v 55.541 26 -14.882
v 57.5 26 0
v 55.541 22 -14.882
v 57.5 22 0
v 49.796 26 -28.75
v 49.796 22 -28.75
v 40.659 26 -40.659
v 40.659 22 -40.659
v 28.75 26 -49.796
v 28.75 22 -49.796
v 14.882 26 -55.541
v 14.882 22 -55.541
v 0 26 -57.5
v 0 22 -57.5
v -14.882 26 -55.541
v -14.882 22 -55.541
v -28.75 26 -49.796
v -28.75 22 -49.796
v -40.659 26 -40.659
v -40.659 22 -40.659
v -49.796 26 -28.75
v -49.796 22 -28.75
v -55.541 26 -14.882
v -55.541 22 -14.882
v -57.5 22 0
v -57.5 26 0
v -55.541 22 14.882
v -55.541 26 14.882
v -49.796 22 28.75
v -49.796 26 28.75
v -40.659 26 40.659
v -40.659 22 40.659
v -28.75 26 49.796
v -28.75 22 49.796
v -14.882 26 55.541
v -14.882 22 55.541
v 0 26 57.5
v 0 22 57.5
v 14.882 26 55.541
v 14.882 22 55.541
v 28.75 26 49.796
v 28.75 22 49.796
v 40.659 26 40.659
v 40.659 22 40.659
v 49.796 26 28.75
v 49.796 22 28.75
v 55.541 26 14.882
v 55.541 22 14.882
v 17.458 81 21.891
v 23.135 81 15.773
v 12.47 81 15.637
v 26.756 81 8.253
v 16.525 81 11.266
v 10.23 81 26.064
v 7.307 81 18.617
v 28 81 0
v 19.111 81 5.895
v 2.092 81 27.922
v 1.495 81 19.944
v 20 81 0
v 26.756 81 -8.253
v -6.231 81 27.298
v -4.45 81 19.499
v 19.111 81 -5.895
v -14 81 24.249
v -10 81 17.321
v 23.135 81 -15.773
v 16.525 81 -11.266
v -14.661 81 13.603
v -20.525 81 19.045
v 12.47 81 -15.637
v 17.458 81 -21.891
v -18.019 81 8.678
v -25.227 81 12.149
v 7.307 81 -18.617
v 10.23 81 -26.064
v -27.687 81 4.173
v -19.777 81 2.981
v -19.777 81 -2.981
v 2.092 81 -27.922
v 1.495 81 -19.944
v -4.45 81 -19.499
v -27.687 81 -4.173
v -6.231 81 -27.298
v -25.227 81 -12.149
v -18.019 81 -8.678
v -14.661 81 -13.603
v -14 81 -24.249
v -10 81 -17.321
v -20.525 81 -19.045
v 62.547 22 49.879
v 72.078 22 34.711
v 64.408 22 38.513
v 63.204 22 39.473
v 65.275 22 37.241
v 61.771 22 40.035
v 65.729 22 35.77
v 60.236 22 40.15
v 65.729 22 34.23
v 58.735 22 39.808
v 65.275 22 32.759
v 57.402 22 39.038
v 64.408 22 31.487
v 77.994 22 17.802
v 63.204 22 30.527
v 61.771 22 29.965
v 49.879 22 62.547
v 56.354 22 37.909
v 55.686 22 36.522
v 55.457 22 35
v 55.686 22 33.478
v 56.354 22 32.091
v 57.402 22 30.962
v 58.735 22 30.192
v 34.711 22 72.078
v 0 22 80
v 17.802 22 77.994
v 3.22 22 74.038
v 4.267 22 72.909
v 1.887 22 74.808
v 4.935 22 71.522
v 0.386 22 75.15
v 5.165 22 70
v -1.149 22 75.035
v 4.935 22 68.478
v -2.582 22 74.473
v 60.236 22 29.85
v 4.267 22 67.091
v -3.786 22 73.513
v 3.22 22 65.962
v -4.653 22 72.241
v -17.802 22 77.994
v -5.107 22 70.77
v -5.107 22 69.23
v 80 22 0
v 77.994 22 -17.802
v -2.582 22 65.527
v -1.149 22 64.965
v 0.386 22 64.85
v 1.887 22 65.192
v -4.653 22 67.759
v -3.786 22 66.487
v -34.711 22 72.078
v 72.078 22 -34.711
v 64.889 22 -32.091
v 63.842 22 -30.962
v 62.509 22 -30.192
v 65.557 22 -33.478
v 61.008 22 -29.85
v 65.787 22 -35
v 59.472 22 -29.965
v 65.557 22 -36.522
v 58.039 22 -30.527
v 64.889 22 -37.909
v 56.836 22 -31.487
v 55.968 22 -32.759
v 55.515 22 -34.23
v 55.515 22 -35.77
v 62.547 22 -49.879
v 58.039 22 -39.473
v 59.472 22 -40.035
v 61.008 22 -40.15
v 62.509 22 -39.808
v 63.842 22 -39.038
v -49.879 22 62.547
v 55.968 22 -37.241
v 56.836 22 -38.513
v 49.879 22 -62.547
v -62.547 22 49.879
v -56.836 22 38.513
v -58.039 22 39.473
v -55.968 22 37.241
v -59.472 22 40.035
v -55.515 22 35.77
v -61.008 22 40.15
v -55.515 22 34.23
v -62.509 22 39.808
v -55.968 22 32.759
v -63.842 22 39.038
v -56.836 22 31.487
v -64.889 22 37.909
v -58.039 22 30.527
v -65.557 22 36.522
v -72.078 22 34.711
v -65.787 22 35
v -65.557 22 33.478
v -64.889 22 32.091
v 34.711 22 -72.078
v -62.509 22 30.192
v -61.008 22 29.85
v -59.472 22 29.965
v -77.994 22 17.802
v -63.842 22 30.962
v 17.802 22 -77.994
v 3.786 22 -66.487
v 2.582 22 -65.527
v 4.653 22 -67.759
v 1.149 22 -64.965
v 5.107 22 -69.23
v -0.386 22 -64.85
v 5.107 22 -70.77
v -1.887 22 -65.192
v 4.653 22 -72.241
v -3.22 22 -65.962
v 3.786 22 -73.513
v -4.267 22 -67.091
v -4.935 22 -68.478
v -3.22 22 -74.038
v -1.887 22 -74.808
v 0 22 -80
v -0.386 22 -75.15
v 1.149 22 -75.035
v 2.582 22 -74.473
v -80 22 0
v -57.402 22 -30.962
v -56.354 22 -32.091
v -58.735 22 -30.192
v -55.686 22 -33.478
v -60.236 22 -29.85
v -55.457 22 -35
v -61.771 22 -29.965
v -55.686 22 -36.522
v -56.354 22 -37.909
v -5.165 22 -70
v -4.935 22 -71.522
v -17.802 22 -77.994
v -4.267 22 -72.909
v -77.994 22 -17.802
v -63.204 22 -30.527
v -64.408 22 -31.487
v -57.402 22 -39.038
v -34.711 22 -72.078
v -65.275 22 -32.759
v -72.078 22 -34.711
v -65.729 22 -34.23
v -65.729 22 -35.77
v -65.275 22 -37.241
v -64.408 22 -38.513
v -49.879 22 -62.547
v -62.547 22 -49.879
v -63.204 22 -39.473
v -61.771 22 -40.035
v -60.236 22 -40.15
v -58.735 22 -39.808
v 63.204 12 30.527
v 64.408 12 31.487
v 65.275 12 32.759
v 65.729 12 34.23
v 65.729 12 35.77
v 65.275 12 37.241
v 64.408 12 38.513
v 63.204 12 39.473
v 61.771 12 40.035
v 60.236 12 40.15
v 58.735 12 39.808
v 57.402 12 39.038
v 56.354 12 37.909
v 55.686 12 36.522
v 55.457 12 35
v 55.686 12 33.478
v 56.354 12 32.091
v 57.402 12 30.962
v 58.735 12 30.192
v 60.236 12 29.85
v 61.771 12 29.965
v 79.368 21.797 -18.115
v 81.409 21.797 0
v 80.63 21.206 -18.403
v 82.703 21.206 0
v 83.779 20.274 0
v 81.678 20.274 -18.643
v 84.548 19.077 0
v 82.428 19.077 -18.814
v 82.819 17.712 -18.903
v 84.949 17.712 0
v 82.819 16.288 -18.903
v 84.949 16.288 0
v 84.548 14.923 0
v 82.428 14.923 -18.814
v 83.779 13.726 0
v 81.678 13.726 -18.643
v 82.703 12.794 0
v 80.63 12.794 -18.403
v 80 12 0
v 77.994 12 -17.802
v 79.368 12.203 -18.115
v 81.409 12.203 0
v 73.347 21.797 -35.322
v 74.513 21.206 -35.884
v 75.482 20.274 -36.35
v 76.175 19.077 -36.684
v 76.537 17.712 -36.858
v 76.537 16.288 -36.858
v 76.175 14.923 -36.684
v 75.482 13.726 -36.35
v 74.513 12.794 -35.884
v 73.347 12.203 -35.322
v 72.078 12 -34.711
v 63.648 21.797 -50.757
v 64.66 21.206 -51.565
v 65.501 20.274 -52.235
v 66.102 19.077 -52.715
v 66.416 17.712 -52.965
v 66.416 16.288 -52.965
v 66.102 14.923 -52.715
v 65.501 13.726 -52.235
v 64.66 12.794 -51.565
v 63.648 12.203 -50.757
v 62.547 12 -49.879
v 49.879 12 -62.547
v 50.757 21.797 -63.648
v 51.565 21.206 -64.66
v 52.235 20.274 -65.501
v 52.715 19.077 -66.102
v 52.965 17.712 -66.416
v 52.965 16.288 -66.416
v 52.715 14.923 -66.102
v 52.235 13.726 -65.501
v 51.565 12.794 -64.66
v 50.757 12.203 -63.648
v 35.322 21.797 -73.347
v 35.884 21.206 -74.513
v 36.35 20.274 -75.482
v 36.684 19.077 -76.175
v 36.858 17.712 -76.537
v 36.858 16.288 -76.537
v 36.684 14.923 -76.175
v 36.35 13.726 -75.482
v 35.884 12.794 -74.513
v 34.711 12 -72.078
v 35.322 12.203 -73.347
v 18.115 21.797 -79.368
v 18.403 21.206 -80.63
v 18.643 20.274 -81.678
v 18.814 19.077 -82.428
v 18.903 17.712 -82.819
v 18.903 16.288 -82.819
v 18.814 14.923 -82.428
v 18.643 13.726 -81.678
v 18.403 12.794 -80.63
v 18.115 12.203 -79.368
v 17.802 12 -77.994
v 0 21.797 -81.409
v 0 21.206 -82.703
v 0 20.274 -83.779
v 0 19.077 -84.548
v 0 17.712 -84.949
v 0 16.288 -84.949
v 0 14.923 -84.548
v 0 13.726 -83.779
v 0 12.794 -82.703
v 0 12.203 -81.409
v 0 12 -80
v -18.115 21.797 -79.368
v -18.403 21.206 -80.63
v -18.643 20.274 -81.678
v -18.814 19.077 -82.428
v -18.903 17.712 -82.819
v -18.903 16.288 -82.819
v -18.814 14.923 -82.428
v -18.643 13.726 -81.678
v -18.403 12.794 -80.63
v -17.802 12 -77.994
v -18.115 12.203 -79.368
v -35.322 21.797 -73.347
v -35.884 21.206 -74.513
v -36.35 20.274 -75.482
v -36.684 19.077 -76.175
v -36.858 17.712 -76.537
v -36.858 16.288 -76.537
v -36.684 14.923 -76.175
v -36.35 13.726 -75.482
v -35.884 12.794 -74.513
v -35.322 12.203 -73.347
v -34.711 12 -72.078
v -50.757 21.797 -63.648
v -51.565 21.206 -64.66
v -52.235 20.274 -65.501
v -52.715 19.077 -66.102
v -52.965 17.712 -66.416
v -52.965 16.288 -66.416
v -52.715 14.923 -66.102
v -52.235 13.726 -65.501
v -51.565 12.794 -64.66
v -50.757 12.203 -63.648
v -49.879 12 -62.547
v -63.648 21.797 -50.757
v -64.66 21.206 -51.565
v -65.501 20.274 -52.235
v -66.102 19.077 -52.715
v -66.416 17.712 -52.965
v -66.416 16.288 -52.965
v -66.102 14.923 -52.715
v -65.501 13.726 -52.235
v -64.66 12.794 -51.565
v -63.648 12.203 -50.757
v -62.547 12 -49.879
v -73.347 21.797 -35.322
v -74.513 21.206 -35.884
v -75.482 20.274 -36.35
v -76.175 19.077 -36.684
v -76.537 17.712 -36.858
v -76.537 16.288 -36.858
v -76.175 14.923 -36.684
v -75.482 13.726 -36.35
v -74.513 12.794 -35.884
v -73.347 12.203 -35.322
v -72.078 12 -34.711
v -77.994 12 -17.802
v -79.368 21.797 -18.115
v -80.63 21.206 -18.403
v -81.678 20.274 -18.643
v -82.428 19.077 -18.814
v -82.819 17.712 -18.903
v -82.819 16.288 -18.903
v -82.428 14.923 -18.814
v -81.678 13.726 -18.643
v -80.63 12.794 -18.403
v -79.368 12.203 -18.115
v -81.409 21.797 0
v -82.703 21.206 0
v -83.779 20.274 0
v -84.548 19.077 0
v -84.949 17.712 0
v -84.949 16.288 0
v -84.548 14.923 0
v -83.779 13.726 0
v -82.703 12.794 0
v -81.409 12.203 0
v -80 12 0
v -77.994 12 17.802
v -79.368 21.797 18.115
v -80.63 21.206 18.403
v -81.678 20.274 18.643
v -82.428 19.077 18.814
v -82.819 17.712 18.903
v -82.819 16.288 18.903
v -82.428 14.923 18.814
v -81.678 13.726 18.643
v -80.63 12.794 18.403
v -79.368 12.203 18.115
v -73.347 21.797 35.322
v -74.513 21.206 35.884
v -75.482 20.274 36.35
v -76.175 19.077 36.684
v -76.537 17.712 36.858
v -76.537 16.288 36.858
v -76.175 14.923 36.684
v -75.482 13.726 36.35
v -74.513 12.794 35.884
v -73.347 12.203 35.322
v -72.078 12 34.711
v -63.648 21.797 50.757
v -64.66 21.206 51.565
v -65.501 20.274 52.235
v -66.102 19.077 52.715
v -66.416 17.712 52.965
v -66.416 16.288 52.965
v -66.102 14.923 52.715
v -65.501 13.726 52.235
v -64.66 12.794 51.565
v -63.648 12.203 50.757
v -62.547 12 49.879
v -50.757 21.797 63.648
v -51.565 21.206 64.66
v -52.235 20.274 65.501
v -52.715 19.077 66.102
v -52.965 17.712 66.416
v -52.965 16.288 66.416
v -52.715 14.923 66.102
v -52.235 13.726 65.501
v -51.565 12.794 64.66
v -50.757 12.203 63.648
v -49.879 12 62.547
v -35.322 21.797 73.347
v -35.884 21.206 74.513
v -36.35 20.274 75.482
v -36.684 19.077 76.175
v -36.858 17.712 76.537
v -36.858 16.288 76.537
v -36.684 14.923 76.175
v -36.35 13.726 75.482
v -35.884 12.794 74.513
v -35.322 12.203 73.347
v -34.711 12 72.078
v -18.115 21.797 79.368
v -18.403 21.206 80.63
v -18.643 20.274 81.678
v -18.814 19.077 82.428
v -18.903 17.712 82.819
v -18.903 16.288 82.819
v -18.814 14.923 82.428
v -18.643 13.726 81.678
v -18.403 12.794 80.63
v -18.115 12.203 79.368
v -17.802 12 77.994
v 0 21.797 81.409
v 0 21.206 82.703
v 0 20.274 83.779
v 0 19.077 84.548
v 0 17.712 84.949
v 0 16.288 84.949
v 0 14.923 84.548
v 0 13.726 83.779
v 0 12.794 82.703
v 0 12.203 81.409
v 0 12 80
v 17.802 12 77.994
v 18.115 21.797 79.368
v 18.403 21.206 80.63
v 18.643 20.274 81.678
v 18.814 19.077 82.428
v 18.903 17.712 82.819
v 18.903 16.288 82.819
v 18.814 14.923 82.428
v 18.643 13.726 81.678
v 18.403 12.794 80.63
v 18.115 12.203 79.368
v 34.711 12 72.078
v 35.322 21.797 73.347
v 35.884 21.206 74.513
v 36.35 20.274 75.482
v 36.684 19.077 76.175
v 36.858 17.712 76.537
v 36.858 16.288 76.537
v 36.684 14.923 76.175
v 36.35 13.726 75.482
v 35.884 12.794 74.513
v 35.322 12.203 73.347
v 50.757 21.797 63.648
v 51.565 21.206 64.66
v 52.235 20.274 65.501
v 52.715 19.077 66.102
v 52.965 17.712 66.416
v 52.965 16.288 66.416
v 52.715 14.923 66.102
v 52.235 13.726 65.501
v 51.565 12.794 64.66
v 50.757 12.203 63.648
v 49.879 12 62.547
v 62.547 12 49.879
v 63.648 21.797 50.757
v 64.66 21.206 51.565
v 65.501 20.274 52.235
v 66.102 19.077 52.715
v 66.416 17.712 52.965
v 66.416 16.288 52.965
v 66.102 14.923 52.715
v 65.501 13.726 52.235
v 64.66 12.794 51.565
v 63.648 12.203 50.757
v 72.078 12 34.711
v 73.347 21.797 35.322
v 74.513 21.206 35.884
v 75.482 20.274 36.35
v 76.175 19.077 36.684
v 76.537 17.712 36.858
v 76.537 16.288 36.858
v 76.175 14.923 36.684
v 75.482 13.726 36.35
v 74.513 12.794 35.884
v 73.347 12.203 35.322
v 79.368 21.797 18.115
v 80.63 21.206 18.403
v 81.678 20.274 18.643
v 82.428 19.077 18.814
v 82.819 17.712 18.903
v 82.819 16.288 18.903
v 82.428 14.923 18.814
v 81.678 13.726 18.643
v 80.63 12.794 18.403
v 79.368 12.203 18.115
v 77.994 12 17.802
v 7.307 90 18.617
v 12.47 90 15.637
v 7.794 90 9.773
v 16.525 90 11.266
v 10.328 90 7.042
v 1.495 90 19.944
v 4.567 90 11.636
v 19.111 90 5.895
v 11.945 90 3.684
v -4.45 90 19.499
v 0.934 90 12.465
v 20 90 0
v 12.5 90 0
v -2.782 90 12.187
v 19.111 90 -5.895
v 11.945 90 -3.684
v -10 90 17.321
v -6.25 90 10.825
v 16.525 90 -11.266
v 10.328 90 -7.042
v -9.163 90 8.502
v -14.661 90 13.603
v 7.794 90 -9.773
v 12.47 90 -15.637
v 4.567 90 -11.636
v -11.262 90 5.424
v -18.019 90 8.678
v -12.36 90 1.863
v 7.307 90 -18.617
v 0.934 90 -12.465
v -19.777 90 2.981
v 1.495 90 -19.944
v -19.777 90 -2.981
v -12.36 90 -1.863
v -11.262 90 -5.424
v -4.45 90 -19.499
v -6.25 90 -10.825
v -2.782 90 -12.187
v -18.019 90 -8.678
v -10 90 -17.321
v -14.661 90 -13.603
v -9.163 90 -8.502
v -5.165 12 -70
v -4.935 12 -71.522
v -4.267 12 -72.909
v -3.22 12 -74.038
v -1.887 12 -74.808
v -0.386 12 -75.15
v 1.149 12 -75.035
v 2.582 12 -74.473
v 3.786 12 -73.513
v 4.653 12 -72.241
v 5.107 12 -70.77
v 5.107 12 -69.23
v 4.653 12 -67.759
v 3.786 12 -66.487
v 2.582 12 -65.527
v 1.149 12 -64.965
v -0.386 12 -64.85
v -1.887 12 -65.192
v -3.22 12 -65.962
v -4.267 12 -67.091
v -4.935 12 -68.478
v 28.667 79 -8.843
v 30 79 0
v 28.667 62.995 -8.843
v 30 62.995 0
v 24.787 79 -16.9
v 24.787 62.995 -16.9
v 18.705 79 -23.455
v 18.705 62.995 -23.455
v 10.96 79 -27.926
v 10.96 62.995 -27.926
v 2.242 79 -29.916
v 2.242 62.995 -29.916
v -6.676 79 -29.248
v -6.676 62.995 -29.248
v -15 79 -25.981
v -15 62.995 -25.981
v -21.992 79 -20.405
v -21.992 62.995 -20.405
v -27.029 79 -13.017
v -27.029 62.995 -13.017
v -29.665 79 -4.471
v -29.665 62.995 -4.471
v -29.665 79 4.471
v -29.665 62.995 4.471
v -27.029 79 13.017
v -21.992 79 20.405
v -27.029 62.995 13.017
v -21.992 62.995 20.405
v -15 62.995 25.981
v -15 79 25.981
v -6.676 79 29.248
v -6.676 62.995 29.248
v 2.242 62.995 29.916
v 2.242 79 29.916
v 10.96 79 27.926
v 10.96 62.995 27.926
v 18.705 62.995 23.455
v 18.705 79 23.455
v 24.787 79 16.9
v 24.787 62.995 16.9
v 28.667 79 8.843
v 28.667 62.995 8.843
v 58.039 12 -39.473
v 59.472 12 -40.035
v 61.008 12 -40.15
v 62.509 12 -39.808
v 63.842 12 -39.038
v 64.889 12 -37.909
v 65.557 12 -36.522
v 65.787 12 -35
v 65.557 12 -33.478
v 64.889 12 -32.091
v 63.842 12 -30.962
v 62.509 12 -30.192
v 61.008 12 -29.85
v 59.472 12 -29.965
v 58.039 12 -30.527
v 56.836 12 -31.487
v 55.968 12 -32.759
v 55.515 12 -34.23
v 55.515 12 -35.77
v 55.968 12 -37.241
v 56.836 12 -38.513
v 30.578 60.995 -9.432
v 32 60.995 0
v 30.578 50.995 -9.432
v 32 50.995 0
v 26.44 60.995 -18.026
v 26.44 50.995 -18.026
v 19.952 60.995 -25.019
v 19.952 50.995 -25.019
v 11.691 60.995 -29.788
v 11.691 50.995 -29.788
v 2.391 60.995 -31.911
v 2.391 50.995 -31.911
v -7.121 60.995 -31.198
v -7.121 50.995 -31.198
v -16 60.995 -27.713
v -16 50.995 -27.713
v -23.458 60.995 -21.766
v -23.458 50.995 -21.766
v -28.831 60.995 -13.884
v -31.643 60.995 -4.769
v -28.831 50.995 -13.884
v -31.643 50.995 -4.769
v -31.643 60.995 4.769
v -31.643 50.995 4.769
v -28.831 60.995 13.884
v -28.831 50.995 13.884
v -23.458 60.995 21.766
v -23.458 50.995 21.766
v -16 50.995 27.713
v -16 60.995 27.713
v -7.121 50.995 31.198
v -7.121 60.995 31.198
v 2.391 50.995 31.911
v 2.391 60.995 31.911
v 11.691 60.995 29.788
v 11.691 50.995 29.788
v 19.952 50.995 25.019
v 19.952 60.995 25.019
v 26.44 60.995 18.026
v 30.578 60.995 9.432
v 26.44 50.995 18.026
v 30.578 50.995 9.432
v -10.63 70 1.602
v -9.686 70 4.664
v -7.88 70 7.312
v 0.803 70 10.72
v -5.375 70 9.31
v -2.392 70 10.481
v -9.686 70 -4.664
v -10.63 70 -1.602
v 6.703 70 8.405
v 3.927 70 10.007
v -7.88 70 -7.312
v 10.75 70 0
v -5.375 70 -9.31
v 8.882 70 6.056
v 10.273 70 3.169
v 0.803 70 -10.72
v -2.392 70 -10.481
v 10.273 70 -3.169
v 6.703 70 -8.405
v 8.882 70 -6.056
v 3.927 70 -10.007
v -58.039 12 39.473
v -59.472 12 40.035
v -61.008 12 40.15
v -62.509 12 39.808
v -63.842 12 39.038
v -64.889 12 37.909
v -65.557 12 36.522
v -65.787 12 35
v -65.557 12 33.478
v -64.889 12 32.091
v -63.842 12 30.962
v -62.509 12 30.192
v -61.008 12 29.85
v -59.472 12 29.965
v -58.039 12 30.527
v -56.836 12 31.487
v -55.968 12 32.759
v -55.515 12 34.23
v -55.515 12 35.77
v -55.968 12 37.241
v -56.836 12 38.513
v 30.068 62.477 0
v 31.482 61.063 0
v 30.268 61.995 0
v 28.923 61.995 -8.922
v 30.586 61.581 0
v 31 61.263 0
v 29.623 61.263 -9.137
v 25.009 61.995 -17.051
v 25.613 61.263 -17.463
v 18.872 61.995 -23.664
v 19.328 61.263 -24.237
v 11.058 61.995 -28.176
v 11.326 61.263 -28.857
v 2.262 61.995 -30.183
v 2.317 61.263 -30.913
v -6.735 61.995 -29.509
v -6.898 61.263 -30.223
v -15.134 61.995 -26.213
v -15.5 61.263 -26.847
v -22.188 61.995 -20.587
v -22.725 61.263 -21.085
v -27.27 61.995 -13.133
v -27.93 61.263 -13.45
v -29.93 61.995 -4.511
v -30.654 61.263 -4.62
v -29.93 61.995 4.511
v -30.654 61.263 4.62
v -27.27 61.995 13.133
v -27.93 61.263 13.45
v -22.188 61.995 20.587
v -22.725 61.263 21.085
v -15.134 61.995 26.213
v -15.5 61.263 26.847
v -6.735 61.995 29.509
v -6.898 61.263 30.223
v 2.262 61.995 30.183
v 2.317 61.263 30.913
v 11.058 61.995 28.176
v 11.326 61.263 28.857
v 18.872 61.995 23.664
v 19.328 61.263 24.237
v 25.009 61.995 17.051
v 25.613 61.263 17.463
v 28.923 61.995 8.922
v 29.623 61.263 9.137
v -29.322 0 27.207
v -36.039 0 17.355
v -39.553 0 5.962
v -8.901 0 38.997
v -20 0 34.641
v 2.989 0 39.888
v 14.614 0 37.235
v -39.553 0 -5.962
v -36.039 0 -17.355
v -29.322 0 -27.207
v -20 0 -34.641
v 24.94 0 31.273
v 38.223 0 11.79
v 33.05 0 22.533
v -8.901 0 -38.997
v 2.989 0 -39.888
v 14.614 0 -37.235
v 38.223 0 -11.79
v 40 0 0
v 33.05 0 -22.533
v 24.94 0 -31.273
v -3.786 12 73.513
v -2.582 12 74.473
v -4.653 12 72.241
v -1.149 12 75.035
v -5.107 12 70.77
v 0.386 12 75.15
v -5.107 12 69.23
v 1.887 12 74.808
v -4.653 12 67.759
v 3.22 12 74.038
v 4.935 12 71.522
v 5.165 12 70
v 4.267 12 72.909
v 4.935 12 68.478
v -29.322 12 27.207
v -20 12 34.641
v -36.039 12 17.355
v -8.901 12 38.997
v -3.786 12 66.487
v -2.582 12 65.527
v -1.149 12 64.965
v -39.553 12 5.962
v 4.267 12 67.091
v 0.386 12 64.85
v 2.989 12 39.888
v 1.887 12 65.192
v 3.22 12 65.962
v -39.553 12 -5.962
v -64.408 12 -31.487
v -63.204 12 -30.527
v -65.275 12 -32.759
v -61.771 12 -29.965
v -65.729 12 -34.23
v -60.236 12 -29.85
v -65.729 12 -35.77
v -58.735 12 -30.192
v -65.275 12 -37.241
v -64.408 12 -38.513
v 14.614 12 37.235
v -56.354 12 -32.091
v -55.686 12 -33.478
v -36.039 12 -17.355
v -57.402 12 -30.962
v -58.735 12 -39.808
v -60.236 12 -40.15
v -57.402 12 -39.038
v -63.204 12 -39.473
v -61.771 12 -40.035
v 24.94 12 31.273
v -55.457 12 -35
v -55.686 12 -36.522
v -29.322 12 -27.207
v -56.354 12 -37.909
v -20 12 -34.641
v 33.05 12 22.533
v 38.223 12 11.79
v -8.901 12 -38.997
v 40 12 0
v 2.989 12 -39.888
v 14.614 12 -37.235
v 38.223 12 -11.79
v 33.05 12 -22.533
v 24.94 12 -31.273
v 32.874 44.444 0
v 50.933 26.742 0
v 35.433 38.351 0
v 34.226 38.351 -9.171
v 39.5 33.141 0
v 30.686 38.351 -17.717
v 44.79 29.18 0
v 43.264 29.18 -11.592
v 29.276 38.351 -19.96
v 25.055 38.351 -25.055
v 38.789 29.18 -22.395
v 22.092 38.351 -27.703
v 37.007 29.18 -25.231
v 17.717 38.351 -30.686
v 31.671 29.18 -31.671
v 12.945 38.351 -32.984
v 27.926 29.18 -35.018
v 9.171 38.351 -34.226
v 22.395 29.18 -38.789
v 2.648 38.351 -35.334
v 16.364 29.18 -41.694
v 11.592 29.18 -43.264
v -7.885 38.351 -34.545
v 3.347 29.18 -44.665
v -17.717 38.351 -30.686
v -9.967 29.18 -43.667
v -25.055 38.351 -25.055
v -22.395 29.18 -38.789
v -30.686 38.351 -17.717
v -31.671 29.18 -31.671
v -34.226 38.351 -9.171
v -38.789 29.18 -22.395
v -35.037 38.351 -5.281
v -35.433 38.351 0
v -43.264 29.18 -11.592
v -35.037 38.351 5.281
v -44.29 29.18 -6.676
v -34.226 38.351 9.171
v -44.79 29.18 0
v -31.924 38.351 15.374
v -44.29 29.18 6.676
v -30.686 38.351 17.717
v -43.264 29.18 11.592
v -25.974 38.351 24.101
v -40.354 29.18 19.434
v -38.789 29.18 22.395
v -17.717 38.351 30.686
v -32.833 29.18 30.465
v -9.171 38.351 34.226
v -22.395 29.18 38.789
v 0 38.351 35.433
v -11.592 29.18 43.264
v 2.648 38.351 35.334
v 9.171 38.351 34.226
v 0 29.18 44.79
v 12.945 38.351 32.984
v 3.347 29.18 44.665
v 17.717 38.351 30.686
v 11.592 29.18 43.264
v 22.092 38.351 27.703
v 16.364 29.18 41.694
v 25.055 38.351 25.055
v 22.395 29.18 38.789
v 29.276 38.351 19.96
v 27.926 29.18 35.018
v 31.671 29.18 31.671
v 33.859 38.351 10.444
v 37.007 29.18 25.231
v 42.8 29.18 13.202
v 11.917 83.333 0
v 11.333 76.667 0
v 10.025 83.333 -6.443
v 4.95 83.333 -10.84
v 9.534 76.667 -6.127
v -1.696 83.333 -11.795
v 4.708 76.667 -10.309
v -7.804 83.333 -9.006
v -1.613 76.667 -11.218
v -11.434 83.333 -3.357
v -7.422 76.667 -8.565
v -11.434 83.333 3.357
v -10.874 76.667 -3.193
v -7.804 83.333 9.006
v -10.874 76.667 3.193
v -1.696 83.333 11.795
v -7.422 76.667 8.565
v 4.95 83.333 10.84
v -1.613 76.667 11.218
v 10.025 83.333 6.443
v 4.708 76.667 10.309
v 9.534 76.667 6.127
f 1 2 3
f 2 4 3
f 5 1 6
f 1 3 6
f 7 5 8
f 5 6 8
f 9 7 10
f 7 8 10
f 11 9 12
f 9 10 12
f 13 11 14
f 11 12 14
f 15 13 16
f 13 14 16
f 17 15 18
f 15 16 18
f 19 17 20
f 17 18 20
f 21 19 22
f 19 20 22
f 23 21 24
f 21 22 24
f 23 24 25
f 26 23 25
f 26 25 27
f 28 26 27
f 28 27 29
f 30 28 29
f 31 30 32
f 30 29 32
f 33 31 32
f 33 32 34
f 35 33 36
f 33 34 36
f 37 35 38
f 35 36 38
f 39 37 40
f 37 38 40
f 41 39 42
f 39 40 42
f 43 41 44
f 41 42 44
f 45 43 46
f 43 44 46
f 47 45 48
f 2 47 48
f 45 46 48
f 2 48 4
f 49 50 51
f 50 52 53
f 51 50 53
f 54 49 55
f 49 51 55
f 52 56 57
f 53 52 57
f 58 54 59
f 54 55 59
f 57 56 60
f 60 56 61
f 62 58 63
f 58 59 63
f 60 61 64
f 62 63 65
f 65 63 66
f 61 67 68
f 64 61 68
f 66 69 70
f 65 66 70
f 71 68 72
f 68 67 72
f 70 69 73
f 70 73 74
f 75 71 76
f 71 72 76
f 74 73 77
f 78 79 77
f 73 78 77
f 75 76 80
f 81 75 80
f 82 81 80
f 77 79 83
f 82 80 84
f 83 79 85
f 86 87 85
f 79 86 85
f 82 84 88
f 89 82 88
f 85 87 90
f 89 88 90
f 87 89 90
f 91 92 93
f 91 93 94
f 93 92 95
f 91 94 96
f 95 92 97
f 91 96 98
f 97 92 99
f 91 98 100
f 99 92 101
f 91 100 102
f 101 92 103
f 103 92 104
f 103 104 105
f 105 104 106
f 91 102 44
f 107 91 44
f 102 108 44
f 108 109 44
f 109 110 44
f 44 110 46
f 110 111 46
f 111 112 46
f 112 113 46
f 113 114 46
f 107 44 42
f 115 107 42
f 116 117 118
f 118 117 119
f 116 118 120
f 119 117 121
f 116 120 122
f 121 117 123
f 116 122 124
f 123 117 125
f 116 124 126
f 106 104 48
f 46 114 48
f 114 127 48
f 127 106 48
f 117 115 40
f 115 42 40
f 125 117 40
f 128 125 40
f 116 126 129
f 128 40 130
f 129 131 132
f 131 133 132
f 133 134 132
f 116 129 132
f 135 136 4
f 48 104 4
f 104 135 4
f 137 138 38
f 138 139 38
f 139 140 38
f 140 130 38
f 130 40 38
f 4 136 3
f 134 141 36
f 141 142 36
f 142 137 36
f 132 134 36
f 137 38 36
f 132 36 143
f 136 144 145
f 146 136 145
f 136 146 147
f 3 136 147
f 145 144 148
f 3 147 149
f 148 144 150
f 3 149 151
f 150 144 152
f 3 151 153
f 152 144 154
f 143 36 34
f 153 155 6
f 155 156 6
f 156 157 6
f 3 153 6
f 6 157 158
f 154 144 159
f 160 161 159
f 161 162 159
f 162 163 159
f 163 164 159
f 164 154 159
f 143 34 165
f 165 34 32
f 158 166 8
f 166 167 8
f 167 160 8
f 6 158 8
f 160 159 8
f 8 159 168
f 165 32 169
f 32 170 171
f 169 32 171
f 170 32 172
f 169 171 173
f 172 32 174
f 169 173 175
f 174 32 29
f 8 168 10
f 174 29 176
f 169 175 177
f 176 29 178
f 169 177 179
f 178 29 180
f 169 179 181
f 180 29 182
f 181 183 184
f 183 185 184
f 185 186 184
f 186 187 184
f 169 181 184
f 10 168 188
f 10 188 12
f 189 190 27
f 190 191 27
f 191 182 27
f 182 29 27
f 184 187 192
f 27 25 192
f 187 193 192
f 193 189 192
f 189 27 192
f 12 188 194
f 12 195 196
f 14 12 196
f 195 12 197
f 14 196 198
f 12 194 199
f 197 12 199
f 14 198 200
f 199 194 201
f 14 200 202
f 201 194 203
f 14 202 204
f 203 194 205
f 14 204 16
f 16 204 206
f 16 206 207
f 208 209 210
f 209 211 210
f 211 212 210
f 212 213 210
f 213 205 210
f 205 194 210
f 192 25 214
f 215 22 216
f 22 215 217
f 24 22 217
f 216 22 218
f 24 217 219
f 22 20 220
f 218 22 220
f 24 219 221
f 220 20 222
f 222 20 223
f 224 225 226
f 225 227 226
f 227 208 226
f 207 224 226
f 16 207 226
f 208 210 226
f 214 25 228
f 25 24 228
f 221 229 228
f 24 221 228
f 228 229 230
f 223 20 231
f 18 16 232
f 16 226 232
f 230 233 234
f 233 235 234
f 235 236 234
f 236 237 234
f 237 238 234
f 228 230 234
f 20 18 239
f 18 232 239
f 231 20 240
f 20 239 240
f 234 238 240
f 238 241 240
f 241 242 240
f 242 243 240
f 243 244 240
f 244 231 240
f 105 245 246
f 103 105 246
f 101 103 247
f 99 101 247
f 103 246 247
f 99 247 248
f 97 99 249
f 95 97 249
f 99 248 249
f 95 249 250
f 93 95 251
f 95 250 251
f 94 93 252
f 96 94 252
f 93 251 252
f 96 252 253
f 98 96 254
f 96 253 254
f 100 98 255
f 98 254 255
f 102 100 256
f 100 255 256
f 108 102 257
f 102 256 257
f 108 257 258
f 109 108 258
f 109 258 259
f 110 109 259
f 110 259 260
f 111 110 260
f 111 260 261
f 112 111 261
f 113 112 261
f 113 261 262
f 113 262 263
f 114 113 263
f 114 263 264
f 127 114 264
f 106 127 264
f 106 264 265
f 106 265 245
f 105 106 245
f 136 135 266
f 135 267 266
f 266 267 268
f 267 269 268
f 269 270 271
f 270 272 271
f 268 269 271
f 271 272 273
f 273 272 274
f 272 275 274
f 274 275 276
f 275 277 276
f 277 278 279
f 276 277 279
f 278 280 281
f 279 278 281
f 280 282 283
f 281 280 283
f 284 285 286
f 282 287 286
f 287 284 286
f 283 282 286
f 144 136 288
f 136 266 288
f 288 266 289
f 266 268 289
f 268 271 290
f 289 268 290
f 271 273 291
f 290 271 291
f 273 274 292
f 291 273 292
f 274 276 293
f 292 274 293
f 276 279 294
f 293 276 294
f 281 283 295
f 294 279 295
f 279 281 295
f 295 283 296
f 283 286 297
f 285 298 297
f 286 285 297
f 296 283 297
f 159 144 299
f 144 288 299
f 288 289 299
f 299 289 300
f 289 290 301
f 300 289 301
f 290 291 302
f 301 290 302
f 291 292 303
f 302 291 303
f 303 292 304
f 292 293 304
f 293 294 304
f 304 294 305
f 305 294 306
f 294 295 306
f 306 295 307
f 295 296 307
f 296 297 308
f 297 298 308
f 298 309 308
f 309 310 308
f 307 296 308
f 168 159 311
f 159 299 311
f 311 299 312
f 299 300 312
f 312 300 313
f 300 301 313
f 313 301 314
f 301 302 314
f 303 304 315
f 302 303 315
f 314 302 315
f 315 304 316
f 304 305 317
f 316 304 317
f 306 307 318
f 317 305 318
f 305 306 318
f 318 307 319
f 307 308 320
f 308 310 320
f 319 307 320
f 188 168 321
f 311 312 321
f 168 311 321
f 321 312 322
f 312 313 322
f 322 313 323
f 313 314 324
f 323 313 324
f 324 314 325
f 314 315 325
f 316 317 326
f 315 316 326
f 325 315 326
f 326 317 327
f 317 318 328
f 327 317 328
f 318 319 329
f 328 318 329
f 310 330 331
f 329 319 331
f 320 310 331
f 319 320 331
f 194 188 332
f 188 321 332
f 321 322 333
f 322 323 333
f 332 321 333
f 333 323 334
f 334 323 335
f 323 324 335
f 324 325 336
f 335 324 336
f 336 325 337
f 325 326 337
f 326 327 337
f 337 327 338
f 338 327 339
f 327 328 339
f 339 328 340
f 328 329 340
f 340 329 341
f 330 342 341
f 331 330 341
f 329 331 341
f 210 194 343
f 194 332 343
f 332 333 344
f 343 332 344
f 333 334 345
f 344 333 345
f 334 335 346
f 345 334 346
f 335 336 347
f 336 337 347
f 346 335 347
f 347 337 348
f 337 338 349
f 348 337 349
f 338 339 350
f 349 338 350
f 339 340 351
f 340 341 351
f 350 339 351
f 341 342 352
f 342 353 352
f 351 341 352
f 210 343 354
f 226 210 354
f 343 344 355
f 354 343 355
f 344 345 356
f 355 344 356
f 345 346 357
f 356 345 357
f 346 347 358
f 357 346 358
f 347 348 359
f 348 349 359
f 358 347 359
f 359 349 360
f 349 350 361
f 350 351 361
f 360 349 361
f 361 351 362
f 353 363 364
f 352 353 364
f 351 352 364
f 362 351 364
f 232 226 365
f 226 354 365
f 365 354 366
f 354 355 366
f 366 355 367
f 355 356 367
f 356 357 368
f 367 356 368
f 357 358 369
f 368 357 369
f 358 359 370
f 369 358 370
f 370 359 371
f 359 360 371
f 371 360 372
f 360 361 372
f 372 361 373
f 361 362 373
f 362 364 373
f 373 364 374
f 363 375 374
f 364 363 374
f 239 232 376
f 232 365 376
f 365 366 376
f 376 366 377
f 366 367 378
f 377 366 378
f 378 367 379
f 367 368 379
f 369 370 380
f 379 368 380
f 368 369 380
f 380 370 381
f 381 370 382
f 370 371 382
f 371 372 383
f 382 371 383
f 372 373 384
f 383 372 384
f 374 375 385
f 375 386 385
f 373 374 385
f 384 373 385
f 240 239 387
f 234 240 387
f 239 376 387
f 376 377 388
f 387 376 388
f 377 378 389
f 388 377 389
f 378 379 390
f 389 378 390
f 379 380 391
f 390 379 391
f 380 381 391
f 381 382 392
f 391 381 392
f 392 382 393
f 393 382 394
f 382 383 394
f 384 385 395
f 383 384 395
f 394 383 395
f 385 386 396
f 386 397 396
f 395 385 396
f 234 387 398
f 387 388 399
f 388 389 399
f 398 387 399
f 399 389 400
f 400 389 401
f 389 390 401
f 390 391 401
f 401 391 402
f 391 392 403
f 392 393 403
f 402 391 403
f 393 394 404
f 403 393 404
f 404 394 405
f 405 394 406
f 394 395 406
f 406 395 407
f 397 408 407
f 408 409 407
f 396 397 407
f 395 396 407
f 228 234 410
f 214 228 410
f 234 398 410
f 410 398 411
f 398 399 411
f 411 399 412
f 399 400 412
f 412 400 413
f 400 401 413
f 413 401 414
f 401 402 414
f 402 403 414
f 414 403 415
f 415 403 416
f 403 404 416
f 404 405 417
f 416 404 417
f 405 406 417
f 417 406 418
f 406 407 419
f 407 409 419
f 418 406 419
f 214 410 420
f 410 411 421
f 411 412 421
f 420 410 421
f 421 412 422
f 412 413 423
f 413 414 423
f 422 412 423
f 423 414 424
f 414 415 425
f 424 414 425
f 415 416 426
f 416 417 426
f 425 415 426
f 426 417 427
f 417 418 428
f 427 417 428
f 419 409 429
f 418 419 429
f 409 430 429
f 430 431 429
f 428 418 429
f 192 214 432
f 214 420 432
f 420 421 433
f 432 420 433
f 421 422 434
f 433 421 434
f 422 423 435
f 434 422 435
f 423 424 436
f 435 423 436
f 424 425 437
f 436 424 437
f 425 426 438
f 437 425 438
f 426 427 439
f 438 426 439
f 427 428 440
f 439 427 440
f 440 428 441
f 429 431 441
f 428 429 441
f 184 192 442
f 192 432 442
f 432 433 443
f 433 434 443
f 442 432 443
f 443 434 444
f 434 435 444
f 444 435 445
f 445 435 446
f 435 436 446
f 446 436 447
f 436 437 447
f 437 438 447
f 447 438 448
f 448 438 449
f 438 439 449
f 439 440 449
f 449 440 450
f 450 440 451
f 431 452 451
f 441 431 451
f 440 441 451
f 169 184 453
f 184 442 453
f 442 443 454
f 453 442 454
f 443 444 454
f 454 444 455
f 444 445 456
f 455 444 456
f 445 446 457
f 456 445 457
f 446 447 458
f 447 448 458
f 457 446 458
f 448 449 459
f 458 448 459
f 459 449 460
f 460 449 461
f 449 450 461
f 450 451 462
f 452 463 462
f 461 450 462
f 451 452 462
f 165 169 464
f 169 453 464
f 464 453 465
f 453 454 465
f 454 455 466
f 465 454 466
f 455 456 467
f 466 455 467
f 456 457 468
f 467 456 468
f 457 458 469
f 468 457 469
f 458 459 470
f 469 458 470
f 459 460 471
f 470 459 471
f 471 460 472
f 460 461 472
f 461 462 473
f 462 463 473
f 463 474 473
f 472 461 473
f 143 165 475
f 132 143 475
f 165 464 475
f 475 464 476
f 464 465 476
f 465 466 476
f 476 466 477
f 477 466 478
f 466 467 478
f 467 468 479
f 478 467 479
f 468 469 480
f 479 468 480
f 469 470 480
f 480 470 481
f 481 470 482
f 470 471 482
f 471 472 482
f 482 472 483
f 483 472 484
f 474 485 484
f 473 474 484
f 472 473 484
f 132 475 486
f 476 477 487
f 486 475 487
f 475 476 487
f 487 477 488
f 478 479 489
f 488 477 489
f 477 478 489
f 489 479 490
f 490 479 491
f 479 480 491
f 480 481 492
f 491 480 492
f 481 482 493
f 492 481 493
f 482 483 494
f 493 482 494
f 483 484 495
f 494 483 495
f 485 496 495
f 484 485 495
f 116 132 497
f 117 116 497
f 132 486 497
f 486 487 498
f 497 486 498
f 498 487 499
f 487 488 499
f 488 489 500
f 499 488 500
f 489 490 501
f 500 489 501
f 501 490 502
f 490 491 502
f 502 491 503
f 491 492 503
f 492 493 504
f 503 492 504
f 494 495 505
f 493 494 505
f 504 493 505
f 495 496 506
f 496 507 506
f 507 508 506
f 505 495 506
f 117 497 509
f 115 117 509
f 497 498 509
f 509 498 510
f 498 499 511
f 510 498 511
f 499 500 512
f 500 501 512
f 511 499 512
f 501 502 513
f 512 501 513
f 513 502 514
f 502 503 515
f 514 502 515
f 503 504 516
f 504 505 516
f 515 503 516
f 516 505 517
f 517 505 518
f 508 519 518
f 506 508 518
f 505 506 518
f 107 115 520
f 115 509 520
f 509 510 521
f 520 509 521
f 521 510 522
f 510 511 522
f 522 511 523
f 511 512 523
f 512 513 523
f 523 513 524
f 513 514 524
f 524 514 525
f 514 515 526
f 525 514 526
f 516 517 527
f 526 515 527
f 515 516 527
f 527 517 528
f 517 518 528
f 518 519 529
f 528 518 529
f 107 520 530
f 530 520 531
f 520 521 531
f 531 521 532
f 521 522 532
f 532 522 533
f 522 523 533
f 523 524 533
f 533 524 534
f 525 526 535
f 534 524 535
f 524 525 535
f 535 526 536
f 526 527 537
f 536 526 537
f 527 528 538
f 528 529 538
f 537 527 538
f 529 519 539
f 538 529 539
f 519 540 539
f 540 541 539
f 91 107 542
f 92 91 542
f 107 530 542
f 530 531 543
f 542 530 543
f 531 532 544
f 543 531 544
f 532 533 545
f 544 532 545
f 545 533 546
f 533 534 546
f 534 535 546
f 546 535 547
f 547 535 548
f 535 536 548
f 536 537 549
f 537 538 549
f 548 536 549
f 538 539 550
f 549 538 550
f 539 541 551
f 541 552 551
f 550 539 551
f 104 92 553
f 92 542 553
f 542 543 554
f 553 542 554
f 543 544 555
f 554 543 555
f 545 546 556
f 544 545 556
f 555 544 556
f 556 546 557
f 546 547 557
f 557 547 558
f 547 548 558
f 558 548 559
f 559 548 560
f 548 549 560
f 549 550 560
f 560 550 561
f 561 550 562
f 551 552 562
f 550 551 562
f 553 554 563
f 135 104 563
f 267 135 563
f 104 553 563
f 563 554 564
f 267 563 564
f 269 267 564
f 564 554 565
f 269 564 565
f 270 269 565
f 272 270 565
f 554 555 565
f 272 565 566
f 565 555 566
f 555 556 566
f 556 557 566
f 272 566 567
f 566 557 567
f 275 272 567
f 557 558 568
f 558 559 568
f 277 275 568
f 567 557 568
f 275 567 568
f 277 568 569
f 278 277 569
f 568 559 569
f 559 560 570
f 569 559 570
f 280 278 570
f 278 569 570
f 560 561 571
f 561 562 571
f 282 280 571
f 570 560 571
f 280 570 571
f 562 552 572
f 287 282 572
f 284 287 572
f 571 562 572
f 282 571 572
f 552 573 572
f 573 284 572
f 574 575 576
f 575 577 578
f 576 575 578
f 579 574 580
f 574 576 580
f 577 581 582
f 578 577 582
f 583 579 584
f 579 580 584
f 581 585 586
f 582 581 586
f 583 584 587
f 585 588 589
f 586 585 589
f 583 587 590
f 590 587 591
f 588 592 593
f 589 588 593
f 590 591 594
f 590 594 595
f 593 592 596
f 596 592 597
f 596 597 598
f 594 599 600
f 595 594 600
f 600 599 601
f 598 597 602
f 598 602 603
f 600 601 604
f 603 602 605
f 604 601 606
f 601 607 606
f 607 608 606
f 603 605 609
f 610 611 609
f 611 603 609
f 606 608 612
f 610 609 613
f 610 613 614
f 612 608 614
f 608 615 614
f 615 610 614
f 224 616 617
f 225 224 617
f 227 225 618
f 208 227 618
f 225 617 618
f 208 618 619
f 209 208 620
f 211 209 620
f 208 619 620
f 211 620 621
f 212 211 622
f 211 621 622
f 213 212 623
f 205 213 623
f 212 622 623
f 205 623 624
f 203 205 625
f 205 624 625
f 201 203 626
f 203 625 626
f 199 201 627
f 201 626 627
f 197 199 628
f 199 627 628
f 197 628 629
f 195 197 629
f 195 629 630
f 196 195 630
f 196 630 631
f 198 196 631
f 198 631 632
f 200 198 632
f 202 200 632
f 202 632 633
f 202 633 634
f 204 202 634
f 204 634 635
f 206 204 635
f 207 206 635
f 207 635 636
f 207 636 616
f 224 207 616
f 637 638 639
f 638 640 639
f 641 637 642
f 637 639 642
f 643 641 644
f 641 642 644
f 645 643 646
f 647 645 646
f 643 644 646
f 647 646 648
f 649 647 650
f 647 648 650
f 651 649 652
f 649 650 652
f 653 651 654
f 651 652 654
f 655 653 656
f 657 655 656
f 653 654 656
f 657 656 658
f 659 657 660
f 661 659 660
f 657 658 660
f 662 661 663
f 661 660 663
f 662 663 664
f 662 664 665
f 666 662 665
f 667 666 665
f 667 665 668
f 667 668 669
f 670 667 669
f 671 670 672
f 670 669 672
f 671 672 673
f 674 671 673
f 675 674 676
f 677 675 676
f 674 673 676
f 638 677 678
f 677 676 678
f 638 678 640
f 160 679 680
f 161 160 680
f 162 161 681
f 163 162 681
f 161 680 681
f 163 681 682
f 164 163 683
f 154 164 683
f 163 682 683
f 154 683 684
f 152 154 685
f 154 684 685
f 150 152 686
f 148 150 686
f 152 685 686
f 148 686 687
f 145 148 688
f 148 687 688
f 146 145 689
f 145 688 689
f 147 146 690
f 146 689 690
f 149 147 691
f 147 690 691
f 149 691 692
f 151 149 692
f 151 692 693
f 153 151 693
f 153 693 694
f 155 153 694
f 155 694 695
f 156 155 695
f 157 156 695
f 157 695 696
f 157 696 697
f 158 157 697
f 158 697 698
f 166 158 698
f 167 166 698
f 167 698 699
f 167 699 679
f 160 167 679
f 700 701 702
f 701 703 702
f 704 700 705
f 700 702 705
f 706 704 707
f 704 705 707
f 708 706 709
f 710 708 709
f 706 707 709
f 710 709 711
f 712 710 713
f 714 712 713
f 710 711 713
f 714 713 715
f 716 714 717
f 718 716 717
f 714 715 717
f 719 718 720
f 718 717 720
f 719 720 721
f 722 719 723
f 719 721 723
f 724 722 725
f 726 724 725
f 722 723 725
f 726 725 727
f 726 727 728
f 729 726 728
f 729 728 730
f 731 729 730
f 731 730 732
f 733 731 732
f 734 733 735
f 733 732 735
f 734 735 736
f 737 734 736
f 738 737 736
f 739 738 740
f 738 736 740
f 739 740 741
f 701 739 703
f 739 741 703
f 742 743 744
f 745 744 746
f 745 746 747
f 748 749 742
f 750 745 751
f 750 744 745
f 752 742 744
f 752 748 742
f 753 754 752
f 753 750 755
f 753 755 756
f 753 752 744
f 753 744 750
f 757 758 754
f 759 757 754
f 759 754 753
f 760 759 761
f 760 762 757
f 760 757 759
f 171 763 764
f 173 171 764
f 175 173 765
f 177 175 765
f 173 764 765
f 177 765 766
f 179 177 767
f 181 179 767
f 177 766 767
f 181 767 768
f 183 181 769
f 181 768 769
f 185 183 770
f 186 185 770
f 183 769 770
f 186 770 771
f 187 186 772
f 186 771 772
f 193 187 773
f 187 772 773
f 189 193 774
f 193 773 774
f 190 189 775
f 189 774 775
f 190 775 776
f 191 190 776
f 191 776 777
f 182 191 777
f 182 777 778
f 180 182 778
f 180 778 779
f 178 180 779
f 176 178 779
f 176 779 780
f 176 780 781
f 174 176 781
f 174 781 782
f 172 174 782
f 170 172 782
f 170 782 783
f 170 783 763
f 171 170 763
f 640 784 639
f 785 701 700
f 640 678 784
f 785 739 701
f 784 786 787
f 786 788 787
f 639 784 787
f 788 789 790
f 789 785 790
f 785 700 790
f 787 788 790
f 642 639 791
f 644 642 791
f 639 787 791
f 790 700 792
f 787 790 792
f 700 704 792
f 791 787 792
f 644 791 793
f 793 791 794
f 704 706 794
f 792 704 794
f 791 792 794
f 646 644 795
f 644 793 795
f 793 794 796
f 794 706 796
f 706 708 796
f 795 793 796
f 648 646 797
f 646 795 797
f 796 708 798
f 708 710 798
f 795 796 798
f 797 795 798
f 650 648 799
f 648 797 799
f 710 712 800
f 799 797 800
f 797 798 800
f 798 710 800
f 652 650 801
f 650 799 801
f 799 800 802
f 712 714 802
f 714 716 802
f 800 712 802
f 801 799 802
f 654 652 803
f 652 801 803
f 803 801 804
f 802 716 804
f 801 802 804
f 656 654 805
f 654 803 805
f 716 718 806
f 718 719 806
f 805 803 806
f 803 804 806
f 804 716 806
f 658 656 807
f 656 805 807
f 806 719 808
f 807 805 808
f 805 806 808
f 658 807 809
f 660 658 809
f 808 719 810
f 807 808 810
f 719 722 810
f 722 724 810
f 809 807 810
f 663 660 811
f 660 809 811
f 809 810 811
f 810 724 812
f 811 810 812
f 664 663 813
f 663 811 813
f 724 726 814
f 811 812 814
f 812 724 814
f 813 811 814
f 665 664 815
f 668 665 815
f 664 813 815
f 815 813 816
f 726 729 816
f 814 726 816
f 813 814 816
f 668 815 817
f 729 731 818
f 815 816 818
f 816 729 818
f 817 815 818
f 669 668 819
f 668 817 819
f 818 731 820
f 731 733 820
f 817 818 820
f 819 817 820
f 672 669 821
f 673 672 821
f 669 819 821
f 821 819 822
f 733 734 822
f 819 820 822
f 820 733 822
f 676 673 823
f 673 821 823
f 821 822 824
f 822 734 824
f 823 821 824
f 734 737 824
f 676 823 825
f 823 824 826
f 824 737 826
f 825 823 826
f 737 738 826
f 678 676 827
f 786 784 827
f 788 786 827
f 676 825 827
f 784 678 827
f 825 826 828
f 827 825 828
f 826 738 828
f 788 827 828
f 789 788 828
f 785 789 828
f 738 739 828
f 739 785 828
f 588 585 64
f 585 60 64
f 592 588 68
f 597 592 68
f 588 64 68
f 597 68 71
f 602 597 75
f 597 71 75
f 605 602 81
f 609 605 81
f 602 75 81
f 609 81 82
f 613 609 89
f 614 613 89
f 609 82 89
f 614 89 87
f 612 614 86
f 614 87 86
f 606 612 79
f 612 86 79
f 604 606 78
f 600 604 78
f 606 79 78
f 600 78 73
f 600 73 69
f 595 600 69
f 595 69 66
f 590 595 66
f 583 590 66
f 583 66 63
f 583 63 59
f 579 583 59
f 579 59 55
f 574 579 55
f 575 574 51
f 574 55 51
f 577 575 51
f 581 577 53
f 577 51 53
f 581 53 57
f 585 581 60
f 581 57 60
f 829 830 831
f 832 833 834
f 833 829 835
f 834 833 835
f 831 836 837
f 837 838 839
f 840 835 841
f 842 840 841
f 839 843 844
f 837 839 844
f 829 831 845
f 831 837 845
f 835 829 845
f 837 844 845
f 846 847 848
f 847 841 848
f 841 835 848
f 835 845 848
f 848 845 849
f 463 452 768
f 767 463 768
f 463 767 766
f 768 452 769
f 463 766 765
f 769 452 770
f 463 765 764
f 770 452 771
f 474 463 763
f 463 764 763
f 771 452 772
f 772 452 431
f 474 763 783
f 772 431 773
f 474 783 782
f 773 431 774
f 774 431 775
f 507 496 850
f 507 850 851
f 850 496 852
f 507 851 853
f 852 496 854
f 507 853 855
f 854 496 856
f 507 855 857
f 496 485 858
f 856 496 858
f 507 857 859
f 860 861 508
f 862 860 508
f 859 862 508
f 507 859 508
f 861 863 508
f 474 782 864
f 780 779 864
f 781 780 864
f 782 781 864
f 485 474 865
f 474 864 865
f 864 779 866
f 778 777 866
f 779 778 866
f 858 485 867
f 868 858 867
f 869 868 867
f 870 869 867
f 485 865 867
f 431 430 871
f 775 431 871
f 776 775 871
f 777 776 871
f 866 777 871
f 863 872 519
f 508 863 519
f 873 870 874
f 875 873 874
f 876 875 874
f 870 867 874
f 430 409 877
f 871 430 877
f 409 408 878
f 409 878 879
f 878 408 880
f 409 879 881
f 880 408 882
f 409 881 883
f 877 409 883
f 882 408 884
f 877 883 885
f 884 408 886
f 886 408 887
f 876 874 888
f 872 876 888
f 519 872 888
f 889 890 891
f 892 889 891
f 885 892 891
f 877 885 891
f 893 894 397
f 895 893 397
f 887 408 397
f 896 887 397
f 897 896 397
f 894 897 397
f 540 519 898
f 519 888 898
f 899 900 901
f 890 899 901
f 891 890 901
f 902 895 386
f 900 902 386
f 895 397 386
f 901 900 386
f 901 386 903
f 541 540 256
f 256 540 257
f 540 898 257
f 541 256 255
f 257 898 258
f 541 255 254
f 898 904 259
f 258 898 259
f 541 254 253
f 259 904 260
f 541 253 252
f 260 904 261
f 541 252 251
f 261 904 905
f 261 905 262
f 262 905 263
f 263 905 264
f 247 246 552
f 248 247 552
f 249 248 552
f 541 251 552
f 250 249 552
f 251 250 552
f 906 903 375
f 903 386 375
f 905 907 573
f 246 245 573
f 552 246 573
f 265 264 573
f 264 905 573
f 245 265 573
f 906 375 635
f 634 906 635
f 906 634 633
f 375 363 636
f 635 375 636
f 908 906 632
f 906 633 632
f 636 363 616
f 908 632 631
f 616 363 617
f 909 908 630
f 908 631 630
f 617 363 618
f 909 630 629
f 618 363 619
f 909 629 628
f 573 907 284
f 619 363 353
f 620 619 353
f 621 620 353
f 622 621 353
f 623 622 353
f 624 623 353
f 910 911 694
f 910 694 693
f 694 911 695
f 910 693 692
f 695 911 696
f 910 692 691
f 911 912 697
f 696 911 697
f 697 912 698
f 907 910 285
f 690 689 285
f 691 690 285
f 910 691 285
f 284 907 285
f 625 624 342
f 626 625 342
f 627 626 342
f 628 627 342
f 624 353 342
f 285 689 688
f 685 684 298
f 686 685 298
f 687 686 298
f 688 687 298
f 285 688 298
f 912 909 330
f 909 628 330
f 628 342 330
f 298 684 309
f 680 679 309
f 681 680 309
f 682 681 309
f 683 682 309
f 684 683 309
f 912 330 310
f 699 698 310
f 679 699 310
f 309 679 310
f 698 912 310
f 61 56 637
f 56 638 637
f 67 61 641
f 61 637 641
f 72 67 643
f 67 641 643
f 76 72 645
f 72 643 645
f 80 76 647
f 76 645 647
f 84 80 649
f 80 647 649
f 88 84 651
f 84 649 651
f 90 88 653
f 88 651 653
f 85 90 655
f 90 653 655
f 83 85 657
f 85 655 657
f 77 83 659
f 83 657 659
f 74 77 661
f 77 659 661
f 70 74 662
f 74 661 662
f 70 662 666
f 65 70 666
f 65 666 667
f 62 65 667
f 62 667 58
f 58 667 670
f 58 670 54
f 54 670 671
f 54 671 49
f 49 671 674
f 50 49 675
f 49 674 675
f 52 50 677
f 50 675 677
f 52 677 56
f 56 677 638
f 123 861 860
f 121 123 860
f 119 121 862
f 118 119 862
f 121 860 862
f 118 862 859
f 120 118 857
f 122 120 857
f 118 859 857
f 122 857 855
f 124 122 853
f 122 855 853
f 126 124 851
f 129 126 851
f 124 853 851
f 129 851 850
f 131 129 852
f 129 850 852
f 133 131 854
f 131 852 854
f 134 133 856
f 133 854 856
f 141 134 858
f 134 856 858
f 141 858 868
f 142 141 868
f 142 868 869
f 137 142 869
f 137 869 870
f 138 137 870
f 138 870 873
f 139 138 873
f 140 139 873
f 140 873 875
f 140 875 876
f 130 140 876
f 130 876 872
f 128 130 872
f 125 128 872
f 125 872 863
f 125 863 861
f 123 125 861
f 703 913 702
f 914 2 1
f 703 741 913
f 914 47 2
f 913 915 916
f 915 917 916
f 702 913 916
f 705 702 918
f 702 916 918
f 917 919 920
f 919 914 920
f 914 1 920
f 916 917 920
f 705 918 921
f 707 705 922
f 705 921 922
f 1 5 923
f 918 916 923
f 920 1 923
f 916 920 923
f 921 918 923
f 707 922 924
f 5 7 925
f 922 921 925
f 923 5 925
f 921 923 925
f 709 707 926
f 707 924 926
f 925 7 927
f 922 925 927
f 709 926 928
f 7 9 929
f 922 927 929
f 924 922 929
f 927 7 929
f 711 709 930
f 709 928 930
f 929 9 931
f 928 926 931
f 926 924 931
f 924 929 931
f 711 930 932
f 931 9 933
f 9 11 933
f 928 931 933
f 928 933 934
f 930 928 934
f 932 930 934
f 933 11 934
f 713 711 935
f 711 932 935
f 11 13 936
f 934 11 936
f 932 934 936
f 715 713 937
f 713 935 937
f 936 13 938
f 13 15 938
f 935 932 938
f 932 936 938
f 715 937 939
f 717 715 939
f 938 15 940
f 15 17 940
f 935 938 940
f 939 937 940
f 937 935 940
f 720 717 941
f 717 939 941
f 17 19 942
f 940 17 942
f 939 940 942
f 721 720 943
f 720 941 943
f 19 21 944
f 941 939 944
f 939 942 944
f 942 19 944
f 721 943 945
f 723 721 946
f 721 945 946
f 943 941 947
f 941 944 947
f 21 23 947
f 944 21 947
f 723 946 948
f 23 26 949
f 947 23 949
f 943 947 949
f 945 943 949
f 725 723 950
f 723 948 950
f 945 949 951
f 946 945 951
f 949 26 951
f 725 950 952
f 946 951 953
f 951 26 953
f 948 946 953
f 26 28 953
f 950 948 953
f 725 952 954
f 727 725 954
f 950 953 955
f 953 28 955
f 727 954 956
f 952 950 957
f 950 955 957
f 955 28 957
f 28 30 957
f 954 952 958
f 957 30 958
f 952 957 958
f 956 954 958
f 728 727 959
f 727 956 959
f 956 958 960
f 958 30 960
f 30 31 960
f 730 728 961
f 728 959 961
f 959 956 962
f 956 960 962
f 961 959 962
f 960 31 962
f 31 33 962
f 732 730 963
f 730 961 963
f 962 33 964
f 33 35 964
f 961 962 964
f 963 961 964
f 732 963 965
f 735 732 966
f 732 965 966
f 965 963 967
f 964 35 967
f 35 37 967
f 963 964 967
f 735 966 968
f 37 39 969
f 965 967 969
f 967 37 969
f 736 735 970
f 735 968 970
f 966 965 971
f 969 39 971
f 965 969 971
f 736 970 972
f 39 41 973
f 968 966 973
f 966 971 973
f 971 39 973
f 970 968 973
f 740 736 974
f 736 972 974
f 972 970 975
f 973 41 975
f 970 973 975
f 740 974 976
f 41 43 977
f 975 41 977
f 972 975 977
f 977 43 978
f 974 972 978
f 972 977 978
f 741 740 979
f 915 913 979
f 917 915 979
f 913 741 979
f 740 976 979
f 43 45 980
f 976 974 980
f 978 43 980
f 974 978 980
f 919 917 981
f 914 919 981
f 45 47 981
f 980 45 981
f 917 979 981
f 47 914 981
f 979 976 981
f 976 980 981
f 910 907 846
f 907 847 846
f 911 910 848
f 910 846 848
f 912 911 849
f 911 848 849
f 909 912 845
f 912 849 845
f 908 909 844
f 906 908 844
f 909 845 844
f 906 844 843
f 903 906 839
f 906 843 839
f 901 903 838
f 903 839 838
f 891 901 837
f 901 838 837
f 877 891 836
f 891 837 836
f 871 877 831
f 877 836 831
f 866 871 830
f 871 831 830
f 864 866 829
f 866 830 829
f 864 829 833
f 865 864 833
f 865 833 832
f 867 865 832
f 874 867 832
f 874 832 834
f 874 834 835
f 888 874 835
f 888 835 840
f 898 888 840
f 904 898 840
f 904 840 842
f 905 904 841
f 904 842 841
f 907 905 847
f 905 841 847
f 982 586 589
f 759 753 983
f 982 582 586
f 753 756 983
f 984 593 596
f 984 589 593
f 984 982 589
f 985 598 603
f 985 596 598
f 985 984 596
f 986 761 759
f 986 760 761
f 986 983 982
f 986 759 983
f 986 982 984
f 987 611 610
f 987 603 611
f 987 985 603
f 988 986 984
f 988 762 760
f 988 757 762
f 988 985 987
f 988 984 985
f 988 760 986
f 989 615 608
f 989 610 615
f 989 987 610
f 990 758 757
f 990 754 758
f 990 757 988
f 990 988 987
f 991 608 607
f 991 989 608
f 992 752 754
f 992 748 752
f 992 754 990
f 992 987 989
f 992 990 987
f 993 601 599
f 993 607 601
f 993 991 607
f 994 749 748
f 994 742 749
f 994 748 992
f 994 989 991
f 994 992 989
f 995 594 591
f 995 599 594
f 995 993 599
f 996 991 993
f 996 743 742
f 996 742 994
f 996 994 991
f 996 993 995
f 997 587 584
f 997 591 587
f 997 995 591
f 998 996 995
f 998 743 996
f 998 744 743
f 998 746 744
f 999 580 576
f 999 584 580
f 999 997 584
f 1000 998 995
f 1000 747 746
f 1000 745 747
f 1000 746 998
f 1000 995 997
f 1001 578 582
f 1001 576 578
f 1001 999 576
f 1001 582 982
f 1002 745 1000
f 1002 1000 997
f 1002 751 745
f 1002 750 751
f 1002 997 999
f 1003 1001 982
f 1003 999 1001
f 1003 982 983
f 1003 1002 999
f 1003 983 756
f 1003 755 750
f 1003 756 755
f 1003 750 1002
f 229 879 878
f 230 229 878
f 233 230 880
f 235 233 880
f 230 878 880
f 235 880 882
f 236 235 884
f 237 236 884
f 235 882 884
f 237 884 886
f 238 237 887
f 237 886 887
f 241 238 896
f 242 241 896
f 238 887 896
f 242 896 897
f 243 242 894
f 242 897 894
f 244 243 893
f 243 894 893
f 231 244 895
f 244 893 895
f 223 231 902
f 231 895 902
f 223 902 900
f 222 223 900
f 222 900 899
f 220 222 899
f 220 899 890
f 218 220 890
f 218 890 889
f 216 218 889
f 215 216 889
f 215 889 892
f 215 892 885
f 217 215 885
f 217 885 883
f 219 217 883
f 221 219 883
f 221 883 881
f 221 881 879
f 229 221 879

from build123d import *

# Parameters (mm, degrees)
CROQUIS2_R            = 12.5
CORTAR_EXTRUIR1_DEPTH = 20
CORTAR_EXTRUIR1_TAPER = 5
CROQUIS3_R            = 5.164873121
CORTAR_EXTRUIR2_DEPTH = 79.0000001
MATRIZC2_COUNT        = 6


with BuildPart() as part:
    # Croquis1 → Revolución1 (revolve)
    with BuildSketch(Plane.XY):
        with BuildLine():
            Line((0, 0), (0, 90))
            Line((0, 90), (20, 90))
            Line((20, 90), (20, 81))
            Line((20, 81), (28, 81))
            Line((28, 81), (30, 79))
            Line((30, 79), (30, 62.9949995))
            ThreePointArc((30, 62.9949995), (30.585786438, 61.580785938), (32, 60.9949995))
            Line((32, 60.9949995), (32, 50.9949995))
            ThreePointArc((32, 50.9949995), (39.5, 33.141428429), (57.5, 26))
            Line((57.5, 26), (57.5, 22))
            Line((57.5, 22), (80, 22))
            ThreePointArc((80, 22), (85, 17), (80, 12))
            Line((80, 12), (40, 12))
            Line((40, 12), (40, 0))
            Line((40, 0), (0, 0))
        make_face()
    revolve(axis=Axis((0, 0, 0), (0, 1, 0)))

    # Croquis2 → Cortar-Extruir1 (cut)
    with BuildSketch(Plane(origin=(0, 90, 0), x_dir=(1, 0, 0), z_dir=(0, 1, 0))):
        Circle(CROQUIS2_R)
    extrude(amount=-CORTAR_EXTRUIR1_DEPTH, taper=CORTAR_EXTRUIR1_TAPER, mode=Mode.SUBTRACT)

    # Croquis3 → Cortar-Extruir2 (cut, through all)
    with BuildSketch(Plane.XZ.offset(-12)):
        with Locations((0, 70)):
            Circle(CROQUIS3_R)
    cortar_extruir2 = extrude(amount=-CORTAR_EXTRUIR2_DEPTH, mode=Mode.SUBTRACT)

    # MatrizC2: Cortar-Extruir2 ×6 about axis
    matrizc2_axis = Axis((0, 0, 0), (0, 1, 0))
    for i in range(1, MATRIZC2_COUNT):
        add(cortar_extruir2.rotate(matrizc2_axis, i * 360 / MATRIZC2_COUNT), mode=Mode.SUBTRACT)


solid = part.part
